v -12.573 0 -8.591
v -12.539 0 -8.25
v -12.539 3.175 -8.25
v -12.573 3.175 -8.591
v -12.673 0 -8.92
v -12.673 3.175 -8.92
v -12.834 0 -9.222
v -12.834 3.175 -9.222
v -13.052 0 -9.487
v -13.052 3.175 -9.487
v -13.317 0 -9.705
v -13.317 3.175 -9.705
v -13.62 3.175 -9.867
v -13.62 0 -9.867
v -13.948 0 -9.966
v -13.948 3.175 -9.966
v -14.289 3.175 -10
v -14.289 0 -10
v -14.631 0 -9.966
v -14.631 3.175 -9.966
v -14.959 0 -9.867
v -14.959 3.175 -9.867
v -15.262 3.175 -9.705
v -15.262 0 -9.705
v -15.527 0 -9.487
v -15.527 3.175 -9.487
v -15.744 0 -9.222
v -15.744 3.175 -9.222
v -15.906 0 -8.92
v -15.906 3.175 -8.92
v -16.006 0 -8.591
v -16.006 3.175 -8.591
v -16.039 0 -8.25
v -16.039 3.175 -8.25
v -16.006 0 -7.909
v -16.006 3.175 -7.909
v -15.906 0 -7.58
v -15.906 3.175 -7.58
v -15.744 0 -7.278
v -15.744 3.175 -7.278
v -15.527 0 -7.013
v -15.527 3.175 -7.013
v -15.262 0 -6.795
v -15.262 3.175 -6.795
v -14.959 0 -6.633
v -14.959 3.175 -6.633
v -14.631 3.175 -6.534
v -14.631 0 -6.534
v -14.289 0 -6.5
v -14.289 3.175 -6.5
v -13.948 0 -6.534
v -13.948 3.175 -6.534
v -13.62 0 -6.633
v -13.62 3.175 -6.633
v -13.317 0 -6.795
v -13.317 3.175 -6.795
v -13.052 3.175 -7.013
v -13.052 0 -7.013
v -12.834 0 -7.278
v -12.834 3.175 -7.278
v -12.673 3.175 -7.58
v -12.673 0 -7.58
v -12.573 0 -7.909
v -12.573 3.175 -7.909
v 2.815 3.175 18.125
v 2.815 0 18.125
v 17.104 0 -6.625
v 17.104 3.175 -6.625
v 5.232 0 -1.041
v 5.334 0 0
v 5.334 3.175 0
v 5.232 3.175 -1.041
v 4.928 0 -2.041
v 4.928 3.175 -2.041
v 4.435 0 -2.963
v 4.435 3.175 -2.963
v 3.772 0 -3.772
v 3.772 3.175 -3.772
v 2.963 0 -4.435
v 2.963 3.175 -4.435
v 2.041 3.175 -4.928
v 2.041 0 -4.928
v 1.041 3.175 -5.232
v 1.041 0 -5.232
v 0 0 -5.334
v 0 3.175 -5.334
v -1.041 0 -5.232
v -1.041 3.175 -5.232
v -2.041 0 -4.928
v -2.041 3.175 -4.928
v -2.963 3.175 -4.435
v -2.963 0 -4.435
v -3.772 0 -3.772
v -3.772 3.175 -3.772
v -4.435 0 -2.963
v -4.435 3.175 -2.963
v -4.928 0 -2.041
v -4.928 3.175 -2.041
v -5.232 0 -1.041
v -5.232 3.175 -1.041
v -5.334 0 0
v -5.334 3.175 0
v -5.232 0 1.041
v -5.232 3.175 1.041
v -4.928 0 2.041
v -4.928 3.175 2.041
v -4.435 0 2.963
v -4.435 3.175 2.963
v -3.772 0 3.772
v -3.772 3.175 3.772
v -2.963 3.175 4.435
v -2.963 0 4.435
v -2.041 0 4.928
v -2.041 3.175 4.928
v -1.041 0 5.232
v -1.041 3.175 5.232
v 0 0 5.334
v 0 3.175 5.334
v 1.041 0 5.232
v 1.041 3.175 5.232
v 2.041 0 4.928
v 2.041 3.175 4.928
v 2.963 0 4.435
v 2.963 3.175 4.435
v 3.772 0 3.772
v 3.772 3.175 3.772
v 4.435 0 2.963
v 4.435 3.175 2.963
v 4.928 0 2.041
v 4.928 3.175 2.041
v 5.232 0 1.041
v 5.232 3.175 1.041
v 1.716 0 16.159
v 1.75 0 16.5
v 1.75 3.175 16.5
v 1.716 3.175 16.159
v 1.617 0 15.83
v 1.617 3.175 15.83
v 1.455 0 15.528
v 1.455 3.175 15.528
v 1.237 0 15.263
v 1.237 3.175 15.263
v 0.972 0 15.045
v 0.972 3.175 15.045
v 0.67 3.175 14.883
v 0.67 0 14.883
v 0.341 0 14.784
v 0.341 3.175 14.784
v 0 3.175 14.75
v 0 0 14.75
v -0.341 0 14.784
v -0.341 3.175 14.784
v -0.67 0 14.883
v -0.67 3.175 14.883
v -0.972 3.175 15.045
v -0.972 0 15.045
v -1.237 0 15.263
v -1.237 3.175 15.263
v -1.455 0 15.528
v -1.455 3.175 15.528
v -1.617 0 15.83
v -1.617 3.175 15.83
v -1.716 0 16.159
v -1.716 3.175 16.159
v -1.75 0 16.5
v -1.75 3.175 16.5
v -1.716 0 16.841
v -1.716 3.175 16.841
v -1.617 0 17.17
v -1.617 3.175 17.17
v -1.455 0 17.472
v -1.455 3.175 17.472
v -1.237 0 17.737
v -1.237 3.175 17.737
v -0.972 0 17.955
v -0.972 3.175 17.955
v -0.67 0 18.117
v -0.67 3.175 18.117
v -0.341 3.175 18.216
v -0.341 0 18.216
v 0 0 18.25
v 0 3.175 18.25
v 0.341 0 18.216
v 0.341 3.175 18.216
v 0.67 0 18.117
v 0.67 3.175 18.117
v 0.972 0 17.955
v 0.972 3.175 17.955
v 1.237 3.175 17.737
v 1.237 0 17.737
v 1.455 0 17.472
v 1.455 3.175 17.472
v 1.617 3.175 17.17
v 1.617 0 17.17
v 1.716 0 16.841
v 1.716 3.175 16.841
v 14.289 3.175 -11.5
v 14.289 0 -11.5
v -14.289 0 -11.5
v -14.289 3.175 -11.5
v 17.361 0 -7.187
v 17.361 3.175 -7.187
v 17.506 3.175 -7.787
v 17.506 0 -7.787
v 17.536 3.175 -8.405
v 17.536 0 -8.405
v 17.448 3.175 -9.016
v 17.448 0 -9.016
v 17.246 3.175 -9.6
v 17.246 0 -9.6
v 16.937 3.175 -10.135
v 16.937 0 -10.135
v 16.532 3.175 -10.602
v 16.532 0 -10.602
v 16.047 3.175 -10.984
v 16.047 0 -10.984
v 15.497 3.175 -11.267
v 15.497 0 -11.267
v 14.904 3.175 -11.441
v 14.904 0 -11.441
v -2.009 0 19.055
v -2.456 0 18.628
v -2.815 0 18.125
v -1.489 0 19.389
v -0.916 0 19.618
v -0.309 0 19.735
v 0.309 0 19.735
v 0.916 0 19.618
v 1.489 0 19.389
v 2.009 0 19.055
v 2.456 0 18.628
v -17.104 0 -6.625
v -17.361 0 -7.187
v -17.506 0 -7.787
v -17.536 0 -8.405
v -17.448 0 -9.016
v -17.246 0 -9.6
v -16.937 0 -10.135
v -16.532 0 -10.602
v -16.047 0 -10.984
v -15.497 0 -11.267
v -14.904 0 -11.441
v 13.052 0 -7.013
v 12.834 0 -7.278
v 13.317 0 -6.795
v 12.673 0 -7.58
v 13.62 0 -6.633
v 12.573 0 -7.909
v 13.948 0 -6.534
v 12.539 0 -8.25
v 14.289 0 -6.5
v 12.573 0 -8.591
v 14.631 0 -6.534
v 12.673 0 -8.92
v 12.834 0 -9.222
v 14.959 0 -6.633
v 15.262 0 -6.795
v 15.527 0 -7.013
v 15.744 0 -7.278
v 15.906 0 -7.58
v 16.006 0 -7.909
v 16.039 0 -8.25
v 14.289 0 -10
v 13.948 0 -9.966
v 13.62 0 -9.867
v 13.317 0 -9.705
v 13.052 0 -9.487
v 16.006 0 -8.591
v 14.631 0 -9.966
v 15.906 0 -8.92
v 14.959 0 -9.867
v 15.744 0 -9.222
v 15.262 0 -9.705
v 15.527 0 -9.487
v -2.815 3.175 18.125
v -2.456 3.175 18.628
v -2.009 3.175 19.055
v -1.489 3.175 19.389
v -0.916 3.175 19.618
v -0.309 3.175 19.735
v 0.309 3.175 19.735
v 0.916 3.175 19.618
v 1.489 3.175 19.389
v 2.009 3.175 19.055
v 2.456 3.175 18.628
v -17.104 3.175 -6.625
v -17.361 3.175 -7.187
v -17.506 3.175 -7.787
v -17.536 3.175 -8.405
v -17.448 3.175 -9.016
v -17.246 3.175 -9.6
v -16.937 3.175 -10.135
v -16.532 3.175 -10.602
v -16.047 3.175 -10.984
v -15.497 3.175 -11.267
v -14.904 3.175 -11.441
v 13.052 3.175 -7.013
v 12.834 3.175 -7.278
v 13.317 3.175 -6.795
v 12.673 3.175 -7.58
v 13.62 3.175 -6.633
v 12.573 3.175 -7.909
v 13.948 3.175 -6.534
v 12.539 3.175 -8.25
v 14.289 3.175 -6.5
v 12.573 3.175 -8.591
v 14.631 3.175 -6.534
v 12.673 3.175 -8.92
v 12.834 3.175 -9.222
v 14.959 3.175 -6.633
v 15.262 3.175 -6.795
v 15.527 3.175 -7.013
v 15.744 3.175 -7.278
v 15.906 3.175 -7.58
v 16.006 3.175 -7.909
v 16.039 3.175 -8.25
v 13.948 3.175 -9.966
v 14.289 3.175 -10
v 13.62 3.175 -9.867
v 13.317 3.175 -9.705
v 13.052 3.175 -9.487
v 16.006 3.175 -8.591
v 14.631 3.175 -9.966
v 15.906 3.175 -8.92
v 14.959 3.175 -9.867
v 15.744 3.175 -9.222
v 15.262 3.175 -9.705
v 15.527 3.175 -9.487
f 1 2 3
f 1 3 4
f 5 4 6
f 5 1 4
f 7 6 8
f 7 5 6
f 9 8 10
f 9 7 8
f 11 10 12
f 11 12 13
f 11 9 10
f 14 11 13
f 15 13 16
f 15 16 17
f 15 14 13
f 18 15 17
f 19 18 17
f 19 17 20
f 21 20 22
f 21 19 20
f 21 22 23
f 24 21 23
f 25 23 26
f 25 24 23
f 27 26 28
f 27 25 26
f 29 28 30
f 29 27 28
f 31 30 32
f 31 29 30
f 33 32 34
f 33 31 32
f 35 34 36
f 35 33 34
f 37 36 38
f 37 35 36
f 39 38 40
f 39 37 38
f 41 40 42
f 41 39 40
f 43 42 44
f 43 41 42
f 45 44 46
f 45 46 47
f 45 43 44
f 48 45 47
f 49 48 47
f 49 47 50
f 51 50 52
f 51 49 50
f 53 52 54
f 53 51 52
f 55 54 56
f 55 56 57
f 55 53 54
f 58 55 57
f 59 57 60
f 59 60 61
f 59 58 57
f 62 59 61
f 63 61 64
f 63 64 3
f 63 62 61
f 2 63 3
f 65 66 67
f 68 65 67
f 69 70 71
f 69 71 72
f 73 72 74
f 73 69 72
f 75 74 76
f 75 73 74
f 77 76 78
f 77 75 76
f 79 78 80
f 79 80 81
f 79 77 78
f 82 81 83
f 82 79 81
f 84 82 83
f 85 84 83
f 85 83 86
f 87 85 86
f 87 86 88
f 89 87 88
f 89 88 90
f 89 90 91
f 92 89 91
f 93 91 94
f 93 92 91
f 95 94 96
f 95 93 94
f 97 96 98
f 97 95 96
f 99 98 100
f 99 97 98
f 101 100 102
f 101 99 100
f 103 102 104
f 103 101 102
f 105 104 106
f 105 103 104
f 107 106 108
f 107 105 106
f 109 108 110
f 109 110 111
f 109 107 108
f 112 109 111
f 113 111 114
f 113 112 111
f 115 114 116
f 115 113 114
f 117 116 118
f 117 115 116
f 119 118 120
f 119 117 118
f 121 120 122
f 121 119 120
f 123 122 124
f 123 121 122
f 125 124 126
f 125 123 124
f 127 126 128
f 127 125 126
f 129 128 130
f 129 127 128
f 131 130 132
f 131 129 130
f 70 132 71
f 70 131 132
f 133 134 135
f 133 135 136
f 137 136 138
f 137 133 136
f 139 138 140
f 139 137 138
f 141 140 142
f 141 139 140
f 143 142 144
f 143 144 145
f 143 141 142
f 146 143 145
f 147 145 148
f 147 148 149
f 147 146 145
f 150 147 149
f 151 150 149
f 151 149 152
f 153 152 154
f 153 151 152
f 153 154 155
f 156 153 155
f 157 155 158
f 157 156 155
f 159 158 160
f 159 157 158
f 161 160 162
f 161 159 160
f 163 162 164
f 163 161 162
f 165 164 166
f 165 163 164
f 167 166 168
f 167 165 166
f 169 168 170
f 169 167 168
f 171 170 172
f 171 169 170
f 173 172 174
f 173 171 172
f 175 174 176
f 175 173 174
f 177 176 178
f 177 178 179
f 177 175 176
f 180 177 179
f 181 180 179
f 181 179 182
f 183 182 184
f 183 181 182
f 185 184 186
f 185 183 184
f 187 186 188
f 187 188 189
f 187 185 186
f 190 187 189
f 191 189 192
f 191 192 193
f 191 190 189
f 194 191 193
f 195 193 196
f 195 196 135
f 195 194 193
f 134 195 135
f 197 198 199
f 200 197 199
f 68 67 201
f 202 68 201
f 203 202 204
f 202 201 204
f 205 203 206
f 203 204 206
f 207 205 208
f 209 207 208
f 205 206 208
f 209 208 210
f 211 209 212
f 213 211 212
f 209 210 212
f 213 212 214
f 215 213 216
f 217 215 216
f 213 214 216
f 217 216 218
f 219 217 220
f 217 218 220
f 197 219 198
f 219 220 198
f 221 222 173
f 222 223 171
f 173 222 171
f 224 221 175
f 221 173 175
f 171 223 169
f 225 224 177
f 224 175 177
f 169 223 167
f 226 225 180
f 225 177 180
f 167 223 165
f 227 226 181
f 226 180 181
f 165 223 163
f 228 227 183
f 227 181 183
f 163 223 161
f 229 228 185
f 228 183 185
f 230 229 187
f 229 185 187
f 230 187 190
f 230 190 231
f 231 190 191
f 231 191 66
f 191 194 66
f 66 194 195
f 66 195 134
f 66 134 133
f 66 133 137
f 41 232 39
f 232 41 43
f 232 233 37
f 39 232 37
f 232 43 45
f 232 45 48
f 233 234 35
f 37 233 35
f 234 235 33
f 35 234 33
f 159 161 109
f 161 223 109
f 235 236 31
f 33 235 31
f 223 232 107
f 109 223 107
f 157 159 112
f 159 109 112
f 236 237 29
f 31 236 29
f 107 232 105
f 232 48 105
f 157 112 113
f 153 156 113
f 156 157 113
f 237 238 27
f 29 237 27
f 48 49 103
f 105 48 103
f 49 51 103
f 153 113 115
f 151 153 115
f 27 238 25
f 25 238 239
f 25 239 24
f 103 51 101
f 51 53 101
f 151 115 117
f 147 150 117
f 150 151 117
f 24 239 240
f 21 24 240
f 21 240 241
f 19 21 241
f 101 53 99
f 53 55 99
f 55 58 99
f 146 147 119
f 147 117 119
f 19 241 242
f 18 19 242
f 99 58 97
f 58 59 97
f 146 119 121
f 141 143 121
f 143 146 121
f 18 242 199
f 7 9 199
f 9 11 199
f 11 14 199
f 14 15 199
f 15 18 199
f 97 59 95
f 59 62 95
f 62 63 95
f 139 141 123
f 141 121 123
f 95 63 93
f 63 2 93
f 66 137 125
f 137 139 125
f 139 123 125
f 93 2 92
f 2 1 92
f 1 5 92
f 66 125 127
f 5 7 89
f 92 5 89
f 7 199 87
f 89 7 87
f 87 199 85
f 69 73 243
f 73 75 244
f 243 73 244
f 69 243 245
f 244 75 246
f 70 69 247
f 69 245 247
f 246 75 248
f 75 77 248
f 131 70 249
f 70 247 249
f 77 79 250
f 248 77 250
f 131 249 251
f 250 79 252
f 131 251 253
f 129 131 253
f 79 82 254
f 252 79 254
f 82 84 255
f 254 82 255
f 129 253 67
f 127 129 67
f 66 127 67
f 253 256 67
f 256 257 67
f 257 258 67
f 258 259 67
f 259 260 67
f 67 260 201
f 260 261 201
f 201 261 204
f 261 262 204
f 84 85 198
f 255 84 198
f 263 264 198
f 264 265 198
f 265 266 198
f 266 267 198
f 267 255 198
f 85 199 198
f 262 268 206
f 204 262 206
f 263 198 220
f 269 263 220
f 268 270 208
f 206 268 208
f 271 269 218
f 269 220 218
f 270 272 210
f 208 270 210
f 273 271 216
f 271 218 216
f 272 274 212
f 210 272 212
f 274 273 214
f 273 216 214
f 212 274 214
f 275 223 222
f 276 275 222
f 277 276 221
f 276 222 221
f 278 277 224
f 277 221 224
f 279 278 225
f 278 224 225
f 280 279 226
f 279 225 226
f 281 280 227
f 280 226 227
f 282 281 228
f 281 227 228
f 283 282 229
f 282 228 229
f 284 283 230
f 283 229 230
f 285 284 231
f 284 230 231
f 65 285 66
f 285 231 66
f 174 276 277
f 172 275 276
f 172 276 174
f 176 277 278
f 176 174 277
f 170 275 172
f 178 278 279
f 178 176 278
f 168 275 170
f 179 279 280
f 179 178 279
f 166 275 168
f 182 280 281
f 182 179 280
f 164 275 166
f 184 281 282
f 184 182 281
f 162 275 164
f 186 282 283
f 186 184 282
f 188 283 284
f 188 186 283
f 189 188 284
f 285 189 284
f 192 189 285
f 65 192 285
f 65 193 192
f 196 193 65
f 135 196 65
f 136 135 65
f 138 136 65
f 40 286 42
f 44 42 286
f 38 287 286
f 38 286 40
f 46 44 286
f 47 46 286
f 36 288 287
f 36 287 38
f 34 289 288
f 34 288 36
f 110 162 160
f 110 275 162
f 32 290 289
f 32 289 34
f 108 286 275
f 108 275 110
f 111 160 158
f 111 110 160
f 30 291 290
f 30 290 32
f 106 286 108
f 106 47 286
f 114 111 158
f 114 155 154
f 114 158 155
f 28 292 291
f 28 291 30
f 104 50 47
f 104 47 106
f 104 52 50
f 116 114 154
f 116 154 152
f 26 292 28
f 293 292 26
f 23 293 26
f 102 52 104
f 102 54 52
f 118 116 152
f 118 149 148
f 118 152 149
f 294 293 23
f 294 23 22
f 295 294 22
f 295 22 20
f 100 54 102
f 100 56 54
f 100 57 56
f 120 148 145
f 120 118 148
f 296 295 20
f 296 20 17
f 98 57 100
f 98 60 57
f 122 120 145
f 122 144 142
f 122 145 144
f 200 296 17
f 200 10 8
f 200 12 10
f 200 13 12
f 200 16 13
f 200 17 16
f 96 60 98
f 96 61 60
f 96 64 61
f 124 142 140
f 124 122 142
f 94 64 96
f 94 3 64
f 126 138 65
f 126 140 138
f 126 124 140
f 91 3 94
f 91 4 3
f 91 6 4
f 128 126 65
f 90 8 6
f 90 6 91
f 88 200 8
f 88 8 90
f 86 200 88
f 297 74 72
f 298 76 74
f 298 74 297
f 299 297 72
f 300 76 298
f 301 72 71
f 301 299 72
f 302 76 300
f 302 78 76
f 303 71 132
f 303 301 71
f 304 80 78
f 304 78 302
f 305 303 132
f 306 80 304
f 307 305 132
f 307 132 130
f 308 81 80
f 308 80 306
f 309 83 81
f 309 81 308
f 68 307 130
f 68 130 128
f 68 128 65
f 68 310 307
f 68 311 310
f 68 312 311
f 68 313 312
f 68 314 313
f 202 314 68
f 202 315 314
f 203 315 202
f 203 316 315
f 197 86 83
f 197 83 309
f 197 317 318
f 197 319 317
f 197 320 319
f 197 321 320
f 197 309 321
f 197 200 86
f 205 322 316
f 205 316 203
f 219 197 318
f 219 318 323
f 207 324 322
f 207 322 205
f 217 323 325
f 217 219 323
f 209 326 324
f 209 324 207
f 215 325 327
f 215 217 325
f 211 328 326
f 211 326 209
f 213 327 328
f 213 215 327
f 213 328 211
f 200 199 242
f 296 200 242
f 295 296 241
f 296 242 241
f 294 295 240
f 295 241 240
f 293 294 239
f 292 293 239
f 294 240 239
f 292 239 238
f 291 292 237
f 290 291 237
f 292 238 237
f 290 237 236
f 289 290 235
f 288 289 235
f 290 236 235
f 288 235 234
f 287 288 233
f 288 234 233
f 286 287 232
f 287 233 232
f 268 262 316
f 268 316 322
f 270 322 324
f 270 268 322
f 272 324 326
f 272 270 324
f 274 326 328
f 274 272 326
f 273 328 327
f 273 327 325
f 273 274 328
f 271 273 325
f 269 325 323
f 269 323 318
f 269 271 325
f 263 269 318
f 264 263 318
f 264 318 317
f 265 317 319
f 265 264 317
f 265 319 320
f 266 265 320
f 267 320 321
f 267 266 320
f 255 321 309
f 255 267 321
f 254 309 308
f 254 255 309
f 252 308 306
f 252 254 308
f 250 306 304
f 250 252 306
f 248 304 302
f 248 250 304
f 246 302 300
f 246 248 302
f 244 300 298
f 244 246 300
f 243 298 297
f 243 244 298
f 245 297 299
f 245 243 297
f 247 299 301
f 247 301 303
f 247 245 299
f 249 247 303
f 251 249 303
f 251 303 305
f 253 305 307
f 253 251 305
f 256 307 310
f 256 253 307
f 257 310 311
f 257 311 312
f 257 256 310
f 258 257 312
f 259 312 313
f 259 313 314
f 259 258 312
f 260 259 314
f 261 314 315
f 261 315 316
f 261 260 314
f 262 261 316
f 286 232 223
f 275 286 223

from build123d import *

# Parameters (mm, degrees)
SKETCH1_R           = 5.334
SKETCH1_R_2         = 1.75
BOSS_EXTRUDE1_DEPTH = 3.175


with BuildPart() as part:
    # Sketch1 → Boss-Extrude1 (new body)
    with BuildSketch(Plane(origin=(0, 0, 0), x_dir=(1, 0, 0), z_dir=(0, 1, 0))):
        with BuildLine():
            Line((-17.104001725, 6.625), (-2.814582562, -18.125))
            ThreePointArc((-2.814582562, -18.125), (0, -19.75), (2.814582562, -18.125))
            Line((2.814582562, -18.125), (17.104001725, 6.625))
            ThreePointArc((17.104001725, 6.625), (17.104001725, 9.875), (14.289419162, 11.5))
            Line((14.289419162, 11.5), (-14.289419162, 11.5))
            ThreePointArc((-14.289419162, 11.5), (-17.104001725, 9.875), (-17.104001725, 6.625))
        make_face()
        Circle(SKETCH1_R, mode=Mode.SUBTRACT)
        with Locations((-14.289419162, 8.25)):
            Circle(SKETCH1_R_2, mode=Mode.SUBTRACT)
        with Locations((0, -16.5)):
            Circle(SKETCH1_R_2, mode=Mode.SUBTRACT)
        with Locations((14.289419162, 8.25)):
            Circle(SKETCH1_R_2, mode=Mode.SUBTRACT)
    extrude(amount=BOSS_EXTRUDE1_DEPTH)


solid = part.part
